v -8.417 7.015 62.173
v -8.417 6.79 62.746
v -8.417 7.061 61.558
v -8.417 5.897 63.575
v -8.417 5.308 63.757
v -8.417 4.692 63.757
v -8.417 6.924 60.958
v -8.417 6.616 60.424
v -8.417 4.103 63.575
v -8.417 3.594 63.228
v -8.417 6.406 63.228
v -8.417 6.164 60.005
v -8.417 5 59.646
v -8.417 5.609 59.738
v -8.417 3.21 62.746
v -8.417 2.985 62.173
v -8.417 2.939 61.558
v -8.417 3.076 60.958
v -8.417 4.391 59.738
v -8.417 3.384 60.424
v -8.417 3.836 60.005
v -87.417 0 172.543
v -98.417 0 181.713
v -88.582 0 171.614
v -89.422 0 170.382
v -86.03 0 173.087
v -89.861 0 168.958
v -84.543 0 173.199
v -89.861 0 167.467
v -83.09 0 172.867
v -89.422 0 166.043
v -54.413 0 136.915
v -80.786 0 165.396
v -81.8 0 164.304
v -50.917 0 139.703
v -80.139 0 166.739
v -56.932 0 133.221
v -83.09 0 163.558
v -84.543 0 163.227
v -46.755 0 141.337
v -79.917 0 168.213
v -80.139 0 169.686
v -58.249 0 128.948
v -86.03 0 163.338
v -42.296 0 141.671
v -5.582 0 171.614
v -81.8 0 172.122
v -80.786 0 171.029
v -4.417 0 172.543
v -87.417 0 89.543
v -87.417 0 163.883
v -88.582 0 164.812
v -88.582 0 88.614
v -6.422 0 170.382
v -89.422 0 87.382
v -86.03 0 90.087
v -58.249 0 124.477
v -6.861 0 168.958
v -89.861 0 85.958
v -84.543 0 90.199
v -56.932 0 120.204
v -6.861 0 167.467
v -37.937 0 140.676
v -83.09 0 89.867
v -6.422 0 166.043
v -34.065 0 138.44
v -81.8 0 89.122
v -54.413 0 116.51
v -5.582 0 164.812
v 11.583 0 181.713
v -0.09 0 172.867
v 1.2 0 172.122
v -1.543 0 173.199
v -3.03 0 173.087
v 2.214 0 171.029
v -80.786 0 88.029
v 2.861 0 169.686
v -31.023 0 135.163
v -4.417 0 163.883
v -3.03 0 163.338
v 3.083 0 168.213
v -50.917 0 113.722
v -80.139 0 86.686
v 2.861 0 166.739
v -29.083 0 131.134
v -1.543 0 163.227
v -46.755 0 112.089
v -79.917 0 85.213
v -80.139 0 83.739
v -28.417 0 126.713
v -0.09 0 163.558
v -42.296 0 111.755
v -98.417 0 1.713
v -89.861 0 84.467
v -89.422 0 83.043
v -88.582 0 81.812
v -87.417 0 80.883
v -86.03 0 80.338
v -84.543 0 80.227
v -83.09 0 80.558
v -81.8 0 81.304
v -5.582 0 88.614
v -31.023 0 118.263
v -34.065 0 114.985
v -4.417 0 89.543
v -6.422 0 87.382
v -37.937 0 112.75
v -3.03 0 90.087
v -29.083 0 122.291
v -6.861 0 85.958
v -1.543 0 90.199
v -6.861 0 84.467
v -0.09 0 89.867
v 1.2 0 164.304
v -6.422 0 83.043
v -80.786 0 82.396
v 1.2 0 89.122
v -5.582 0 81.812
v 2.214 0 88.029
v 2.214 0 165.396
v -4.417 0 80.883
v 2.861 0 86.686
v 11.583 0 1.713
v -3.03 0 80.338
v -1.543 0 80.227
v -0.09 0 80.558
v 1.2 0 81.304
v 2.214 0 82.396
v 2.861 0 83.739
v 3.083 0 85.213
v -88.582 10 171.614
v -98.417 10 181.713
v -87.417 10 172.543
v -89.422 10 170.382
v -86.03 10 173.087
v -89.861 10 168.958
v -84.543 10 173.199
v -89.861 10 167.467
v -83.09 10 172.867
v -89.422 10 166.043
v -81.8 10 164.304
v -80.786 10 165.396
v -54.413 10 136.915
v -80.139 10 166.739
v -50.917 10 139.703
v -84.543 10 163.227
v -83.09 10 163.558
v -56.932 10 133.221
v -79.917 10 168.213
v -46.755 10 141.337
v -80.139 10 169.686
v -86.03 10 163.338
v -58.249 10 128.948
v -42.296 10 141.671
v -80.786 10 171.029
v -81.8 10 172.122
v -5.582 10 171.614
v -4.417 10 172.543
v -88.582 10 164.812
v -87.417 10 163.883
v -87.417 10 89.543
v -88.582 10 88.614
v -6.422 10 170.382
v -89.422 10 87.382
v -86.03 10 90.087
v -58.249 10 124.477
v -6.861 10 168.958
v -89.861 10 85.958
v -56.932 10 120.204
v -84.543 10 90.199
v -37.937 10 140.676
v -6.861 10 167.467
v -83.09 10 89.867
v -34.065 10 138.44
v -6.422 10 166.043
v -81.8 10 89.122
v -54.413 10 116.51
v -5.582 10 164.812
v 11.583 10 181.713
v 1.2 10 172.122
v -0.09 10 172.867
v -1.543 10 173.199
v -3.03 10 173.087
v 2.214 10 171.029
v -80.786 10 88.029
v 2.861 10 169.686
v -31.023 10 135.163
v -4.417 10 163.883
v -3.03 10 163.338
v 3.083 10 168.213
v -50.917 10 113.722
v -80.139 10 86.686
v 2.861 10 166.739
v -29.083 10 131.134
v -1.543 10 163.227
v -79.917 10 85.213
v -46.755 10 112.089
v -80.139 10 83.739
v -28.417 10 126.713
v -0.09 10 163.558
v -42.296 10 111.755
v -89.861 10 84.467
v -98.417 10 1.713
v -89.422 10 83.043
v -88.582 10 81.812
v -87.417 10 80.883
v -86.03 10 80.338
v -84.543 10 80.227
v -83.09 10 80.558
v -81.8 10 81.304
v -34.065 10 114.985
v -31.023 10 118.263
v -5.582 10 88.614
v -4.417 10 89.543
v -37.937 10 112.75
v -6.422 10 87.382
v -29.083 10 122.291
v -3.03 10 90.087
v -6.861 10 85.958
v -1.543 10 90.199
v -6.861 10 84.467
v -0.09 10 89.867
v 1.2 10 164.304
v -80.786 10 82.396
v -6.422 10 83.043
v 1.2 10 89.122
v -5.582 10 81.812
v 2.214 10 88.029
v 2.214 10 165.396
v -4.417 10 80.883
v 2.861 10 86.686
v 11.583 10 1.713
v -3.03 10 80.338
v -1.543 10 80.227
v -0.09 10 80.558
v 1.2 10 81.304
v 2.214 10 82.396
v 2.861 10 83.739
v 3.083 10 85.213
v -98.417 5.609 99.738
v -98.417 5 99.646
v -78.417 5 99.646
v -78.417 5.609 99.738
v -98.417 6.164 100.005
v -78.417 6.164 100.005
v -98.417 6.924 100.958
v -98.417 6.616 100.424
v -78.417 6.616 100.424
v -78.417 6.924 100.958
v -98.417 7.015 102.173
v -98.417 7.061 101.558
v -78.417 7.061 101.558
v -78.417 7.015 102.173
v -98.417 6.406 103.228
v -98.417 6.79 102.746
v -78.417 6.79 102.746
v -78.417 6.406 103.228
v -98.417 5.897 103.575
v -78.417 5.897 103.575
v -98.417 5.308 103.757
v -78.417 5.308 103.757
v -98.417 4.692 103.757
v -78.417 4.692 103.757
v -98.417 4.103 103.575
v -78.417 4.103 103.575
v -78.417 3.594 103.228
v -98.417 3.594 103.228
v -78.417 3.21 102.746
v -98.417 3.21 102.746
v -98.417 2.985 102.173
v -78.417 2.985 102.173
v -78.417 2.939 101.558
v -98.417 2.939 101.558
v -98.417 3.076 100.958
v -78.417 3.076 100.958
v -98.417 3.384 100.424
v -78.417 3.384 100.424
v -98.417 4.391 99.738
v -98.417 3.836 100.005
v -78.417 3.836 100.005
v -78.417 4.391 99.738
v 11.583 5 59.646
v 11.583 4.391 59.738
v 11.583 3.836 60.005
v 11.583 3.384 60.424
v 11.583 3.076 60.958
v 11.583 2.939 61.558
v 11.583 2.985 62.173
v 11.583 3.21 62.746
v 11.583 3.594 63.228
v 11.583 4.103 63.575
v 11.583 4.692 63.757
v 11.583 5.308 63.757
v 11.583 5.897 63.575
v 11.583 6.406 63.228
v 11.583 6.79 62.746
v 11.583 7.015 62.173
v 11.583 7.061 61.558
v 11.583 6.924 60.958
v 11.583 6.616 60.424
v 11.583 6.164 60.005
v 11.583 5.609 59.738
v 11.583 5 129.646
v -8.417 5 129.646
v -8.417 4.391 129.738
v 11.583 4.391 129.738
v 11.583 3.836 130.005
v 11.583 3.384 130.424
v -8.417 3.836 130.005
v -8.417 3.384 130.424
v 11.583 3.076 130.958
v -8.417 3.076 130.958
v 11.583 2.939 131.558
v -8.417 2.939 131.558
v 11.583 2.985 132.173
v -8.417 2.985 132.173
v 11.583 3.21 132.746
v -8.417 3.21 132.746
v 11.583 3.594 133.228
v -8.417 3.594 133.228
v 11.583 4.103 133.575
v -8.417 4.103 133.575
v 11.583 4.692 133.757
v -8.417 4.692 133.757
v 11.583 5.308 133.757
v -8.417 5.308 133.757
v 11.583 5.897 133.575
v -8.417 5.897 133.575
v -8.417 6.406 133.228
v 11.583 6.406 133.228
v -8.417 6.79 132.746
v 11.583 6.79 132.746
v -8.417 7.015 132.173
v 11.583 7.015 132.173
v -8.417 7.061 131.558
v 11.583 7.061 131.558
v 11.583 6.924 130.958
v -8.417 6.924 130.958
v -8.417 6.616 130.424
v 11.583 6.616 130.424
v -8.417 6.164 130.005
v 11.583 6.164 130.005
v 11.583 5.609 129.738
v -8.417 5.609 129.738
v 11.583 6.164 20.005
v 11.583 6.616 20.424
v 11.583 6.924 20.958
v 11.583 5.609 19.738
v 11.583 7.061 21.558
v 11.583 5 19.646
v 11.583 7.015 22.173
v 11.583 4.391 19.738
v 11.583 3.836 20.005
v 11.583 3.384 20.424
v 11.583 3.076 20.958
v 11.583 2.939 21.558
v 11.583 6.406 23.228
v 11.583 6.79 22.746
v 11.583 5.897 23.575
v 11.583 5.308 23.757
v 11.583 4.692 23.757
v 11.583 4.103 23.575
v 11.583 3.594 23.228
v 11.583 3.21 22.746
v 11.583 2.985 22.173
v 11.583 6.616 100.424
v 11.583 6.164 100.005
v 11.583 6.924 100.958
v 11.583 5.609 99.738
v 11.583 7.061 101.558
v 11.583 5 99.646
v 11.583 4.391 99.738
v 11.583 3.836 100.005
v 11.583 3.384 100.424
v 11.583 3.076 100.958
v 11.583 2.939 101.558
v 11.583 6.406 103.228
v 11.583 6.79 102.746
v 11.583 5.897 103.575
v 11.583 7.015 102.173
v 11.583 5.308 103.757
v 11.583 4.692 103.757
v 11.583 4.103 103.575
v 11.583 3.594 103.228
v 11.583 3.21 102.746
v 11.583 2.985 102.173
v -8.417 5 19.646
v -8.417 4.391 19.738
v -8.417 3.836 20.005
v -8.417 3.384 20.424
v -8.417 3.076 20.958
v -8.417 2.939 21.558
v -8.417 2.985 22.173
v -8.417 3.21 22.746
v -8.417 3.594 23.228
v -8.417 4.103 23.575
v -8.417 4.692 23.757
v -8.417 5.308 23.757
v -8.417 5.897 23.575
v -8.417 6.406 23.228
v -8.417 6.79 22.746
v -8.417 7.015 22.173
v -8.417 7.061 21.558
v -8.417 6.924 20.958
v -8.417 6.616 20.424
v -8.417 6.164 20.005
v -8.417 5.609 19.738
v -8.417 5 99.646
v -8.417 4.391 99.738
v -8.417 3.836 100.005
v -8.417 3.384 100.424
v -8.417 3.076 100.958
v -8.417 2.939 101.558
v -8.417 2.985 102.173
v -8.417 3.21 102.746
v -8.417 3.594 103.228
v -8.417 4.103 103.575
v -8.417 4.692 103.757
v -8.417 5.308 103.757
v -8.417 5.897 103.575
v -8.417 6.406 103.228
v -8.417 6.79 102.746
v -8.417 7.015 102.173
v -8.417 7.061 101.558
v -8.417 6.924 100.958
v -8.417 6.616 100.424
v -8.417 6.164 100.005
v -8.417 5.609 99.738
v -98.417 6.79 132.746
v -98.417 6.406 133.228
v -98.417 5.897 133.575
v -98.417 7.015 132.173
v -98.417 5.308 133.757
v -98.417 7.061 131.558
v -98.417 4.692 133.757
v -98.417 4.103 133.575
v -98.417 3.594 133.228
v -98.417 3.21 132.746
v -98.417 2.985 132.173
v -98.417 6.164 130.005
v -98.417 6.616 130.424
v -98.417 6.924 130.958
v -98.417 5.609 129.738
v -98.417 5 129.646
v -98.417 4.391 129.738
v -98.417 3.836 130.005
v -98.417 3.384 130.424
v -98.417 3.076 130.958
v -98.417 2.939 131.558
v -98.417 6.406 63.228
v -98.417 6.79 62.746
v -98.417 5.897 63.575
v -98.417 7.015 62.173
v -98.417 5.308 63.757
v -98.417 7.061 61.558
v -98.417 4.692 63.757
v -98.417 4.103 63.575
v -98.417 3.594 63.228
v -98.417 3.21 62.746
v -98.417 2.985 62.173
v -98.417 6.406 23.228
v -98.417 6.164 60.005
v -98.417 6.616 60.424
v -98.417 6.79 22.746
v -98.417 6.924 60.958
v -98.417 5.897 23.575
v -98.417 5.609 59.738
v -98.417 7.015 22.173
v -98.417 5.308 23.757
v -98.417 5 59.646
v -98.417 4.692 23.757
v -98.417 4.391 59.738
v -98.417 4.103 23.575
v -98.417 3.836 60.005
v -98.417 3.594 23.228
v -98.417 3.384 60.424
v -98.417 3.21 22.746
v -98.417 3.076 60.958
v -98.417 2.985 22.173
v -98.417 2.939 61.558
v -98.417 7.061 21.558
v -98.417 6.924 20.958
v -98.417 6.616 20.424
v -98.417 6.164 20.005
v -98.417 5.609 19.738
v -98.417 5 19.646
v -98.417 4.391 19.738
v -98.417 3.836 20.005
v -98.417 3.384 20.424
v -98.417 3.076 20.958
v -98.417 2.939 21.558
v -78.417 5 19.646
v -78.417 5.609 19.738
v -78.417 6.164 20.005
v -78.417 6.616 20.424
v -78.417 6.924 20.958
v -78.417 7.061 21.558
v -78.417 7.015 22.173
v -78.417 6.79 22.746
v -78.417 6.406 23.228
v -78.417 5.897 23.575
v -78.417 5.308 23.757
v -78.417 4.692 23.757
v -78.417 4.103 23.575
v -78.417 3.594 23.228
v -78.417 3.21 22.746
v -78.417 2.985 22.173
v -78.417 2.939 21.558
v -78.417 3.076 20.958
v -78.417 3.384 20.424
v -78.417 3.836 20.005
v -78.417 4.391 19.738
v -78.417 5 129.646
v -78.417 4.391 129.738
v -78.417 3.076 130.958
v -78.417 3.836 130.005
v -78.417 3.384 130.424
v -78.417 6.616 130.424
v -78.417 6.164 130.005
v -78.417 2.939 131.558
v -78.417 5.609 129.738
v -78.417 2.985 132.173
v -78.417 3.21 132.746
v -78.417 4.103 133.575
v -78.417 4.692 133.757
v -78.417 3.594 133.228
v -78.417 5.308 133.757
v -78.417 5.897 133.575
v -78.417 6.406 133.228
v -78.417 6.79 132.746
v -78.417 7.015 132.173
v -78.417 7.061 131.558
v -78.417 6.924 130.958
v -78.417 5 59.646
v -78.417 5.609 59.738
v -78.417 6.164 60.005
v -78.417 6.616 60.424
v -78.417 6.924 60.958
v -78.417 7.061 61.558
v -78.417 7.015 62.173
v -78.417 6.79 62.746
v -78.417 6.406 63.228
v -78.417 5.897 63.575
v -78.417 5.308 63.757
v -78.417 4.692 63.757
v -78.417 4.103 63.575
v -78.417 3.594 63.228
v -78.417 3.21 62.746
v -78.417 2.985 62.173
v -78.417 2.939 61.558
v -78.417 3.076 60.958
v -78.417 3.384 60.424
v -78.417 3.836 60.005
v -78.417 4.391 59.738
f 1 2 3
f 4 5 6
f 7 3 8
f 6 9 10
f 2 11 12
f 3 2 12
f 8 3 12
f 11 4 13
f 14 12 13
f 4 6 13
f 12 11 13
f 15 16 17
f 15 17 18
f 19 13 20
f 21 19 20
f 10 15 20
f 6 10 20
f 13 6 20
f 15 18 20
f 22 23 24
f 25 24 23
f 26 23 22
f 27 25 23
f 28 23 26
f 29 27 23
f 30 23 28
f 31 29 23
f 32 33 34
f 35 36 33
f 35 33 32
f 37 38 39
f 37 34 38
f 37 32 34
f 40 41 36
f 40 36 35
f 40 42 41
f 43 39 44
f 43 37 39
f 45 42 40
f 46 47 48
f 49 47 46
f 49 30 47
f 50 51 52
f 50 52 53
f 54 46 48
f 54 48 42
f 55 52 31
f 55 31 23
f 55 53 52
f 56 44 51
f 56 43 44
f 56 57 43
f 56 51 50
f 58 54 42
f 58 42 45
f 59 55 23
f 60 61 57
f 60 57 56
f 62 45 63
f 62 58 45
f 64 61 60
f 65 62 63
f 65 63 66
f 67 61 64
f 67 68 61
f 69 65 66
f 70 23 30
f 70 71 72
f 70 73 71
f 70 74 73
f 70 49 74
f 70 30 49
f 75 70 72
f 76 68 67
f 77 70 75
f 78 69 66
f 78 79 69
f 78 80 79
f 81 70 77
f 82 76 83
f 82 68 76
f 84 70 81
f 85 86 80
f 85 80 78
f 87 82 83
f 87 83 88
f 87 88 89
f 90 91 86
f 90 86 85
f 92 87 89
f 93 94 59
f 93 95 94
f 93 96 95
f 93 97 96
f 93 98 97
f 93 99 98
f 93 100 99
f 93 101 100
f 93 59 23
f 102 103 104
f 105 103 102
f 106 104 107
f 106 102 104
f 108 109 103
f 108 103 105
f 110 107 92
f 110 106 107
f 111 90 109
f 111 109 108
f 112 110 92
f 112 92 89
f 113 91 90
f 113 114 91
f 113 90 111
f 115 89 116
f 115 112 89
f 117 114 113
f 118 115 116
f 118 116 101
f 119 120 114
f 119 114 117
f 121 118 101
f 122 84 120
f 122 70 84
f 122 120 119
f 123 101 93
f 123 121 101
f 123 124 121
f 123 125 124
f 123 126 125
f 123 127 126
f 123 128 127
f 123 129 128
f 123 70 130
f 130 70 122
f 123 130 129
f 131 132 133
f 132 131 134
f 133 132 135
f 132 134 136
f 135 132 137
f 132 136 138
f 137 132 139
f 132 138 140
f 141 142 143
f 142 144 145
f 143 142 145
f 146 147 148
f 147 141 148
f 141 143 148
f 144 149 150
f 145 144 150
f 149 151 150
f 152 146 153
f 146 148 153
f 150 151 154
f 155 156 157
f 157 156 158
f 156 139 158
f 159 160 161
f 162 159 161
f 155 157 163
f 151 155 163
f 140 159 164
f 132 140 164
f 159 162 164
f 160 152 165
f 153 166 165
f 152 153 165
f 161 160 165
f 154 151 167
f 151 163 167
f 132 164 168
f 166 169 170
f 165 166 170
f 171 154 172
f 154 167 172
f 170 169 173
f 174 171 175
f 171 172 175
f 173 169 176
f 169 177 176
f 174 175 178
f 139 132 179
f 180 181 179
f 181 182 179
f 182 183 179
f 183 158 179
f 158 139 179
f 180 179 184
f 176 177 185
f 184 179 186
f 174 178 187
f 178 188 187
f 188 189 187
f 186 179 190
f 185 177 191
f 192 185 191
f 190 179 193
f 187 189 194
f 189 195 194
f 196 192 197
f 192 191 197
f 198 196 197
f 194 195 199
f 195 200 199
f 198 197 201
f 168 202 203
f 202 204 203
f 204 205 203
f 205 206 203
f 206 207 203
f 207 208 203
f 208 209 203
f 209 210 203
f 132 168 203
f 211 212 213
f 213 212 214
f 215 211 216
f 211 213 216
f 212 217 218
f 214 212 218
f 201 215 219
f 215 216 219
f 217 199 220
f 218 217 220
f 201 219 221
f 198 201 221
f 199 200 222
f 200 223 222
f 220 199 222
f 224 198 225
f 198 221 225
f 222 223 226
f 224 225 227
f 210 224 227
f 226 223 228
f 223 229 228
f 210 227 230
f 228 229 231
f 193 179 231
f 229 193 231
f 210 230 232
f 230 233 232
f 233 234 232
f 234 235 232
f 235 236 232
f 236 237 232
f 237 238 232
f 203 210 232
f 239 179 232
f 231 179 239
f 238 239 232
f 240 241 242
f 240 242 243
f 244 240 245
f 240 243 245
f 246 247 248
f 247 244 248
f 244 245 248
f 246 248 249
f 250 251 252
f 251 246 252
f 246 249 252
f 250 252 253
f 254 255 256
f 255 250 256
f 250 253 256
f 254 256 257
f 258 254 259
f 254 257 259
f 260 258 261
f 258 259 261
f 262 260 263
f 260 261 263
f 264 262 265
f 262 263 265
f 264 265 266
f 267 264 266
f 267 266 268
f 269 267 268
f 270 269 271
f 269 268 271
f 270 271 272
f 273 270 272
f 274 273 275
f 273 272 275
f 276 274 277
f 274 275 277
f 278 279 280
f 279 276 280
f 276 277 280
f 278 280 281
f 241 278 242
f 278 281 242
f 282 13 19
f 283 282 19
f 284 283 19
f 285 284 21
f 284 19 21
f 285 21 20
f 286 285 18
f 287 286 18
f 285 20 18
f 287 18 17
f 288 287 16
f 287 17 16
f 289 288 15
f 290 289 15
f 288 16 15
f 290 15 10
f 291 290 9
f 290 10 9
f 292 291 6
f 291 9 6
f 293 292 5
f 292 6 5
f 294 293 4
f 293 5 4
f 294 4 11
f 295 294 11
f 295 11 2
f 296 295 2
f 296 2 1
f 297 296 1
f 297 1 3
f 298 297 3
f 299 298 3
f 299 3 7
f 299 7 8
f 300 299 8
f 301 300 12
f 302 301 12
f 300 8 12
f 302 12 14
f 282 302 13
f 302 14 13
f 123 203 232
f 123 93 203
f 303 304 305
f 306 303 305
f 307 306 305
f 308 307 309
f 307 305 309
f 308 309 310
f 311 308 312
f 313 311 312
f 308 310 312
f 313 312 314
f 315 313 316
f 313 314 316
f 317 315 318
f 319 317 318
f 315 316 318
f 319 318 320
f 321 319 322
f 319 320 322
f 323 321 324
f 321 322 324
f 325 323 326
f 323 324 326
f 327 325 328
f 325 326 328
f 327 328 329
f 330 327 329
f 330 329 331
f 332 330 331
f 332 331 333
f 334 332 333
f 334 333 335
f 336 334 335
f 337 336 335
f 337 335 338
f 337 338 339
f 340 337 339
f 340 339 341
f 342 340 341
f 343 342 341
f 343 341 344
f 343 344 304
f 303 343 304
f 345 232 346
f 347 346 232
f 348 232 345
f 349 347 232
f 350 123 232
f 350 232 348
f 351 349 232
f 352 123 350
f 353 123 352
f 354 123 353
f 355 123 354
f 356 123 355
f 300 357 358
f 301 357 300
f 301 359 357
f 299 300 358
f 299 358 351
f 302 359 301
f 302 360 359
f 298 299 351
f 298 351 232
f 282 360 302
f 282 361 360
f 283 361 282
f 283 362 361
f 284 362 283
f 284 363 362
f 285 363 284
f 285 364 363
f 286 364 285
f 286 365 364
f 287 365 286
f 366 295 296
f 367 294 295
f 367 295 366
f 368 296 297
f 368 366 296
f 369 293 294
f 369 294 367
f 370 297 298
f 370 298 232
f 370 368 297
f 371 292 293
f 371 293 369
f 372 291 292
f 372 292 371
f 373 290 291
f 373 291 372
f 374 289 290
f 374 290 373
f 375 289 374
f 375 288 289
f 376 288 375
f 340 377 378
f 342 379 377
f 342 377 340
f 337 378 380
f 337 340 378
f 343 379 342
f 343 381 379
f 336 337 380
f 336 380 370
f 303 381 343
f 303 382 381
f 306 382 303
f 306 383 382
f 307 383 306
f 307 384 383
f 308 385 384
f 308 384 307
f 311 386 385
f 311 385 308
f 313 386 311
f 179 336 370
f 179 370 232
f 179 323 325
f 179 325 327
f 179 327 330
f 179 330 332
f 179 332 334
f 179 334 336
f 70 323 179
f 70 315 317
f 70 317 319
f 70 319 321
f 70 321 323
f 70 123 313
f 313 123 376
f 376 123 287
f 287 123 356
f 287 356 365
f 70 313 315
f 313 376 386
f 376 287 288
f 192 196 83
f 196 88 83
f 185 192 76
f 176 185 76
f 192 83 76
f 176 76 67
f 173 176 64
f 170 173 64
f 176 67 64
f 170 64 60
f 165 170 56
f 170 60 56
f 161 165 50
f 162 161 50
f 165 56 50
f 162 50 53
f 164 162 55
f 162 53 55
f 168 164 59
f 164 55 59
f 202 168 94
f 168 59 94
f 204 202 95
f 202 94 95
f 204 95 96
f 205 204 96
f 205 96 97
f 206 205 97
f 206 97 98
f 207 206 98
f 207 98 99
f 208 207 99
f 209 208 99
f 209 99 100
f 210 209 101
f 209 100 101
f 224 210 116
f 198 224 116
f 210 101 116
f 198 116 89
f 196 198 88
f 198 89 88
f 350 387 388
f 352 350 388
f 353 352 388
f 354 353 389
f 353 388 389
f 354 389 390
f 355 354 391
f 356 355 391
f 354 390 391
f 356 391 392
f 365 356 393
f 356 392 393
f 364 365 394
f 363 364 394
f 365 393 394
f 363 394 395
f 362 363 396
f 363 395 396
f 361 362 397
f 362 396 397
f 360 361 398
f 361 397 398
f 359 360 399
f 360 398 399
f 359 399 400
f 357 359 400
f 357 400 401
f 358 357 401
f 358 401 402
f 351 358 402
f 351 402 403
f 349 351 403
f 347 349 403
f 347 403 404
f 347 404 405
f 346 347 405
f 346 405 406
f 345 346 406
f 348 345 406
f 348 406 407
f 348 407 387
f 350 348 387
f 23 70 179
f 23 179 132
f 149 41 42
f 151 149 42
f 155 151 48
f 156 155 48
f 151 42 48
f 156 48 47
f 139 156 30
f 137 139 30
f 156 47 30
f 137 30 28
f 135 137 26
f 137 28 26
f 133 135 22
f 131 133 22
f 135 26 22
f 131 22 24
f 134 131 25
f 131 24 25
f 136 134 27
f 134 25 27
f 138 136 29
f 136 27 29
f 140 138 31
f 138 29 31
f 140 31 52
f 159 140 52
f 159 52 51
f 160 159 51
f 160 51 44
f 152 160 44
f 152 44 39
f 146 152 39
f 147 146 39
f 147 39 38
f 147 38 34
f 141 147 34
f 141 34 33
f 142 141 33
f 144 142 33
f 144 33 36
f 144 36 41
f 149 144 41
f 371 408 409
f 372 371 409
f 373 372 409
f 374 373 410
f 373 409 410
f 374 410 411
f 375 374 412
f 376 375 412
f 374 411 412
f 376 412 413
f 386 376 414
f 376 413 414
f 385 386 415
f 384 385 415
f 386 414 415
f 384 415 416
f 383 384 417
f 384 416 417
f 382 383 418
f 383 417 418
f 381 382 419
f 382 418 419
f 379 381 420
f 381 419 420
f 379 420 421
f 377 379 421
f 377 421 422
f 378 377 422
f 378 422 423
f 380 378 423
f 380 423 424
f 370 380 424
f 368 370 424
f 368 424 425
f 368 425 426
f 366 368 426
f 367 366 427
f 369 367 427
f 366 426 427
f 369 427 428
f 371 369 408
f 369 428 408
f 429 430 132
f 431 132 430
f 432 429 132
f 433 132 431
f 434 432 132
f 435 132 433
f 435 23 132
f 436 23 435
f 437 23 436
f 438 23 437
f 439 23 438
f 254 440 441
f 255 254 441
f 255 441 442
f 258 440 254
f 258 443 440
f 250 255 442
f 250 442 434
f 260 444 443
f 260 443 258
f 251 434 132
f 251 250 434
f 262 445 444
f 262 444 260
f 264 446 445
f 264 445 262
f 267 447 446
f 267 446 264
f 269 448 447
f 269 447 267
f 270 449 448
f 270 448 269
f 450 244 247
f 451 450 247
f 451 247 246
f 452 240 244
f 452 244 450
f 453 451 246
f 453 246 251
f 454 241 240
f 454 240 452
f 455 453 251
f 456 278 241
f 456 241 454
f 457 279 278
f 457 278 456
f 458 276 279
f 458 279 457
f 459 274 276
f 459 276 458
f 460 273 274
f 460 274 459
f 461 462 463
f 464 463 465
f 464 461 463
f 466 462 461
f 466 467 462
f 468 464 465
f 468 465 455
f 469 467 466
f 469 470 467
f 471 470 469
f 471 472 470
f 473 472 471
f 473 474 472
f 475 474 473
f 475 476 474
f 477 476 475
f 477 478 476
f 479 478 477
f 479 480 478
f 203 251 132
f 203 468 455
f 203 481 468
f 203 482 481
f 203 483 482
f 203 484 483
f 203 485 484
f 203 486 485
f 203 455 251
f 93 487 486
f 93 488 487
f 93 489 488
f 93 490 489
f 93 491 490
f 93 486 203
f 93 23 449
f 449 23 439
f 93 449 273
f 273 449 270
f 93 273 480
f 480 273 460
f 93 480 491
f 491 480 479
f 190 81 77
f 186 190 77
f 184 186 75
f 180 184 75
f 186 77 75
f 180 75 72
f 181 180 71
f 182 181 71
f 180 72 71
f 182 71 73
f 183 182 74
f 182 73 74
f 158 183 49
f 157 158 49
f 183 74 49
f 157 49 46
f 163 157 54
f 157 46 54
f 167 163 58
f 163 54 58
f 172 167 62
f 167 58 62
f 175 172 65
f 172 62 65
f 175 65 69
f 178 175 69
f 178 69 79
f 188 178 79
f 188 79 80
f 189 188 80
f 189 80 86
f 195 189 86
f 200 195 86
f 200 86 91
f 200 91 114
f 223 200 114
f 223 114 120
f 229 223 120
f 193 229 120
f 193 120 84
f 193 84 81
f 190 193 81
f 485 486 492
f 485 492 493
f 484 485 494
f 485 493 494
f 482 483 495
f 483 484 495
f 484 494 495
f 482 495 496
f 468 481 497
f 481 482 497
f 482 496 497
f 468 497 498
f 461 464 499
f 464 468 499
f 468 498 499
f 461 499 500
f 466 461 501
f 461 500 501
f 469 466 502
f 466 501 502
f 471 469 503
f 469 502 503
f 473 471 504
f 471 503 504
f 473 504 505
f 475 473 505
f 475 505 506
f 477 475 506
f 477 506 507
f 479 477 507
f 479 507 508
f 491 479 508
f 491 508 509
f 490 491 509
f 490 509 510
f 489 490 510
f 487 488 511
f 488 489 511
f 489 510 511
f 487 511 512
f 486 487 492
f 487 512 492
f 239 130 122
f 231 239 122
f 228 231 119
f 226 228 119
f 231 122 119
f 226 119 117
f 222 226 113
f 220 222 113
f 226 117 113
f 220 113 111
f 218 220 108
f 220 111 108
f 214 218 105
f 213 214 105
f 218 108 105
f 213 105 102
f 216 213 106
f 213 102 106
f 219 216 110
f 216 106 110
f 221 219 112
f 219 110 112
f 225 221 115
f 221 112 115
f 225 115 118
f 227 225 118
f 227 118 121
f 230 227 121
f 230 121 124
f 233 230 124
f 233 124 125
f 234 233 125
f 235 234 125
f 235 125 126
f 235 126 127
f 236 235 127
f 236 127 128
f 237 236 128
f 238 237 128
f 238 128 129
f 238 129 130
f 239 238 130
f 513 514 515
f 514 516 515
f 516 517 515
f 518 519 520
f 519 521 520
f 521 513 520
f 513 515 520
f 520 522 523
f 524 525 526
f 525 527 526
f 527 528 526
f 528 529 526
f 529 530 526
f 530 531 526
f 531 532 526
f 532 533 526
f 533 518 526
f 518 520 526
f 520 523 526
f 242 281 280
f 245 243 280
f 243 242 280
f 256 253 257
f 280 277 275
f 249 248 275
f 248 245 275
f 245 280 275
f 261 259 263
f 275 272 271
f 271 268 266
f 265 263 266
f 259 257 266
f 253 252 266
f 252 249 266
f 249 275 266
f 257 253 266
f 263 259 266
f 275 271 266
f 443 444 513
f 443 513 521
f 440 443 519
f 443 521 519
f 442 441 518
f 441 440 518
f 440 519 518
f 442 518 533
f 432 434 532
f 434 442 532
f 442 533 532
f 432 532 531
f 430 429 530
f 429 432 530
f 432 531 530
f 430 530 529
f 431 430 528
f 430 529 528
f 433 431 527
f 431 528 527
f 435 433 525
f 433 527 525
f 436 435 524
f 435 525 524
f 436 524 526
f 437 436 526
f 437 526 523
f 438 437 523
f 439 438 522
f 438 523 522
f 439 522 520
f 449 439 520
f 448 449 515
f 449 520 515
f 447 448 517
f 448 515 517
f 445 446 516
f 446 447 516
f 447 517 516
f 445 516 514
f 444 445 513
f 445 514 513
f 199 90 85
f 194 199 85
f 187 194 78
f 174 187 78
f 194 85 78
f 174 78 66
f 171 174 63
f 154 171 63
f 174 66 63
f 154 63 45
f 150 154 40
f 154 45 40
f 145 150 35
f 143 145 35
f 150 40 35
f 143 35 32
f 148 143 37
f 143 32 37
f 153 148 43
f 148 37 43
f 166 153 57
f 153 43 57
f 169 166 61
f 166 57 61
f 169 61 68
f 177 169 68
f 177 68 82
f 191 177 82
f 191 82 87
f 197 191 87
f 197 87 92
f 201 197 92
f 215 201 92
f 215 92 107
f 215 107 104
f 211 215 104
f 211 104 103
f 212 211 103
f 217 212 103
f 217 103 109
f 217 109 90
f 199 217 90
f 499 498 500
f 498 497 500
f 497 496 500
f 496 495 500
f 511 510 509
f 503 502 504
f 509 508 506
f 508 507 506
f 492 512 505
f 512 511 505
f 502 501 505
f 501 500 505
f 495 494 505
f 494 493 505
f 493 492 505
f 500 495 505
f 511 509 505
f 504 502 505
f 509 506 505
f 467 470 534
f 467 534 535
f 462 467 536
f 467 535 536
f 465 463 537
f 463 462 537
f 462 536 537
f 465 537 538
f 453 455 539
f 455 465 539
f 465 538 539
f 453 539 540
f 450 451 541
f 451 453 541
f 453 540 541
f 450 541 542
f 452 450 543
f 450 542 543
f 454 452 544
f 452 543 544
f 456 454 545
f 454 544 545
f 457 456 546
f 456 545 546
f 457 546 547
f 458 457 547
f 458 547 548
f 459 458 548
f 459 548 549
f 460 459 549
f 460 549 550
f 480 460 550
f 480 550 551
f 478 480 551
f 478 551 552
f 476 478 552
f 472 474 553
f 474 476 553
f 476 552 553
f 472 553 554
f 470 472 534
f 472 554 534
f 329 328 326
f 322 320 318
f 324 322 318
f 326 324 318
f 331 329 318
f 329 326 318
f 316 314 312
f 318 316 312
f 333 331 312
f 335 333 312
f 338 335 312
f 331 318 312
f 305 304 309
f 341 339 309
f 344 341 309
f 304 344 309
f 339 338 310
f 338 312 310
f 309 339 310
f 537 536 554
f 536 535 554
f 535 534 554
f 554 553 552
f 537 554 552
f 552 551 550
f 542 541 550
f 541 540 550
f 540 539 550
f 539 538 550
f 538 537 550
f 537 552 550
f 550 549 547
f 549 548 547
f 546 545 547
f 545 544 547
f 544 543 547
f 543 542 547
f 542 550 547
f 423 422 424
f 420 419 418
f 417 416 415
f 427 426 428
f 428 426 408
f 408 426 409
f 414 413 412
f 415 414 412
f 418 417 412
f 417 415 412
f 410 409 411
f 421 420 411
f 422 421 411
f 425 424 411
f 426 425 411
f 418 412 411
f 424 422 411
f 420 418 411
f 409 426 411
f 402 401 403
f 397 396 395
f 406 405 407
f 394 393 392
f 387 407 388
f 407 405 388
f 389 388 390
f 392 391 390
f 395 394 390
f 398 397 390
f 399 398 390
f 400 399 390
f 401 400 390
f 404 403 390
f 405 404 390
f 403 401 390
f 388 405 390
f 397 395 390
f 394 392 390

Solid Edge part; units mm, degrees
sketch "Sketch1" plane through (0, 0, 0) normal (0, -1, 0) x (1, 0, 0)
  line L0 (-98.417, 1.7127) -> (11.583, 1.7127)
  line L1 (11.583, 1.7127) -> (11.583, 181.7127)
  line L2 (11.583, 181.7127) -> (-98.417, 181.7127)
  line L3 (-98.417, 181.7127) -> (-98.417, 1.7127)
  dimension "D1" = 110
  dimension "D2" = 180
extrude "Protrusion1" add sketch "Sketch1" against normal blind 10
sketch "Sketch2" plane through (-48.417, 0, 81.7127) normal (0, -1, 0) x (1, 0, 0)
  circle A0 centre (-36.5, 86.5) radius 5
  circle A1 centre (46.5, 86.5) radius 5
  circle A2 centre (-36.5, 3.5) radius 5
  circle A3 centre (46.5, 3.5) radius 5
  circle A4 centre (5, 45) radius 15
  dimension "D1" = 125
  dimension "D2" = 10
  dimension "D3" = 10
  dimension "D4" = 10
  dimension "D5" = 83
  dimension "D6" = 83
  dimension "D7" = 41.5
  dimension "D8" = 41.5
extrude "Cutout1" cut sketch "Sketch2" against normal through all
extrude "Cutout2" [suppressed]
extrude "Protrusion2" [suppressed]
extrude "Cutout3" [suppressed]
hole "Hole_1" at (11.583, 5, 61.7127) direction (-1, 0, 0) diameter 4.134 depth 20 thread major 5 thread length 2
hole "Hole1" at (11.583, 5, 101.7127) direction (-1, 0, 0) diameter 4.134 depth 20 thread major 5 thread length 2
hole "Hole2" at (11.583, 5, 21.7127) direction (-1, 0, 0) diameter 4.134 depth 20 thread major 5 thread length 2
hole "Hole3" at (11.583, 5, 131.7127) direction (-1, 0, 0) diameter 4.134 depth 20 thread major 5 thread length 2
mirror "Mirror1" about plane through (-43.417, 5, 91.7127) normal (1, 0, 0) of "Hole_1", "Hole1", "Hole2", "Hole3"
